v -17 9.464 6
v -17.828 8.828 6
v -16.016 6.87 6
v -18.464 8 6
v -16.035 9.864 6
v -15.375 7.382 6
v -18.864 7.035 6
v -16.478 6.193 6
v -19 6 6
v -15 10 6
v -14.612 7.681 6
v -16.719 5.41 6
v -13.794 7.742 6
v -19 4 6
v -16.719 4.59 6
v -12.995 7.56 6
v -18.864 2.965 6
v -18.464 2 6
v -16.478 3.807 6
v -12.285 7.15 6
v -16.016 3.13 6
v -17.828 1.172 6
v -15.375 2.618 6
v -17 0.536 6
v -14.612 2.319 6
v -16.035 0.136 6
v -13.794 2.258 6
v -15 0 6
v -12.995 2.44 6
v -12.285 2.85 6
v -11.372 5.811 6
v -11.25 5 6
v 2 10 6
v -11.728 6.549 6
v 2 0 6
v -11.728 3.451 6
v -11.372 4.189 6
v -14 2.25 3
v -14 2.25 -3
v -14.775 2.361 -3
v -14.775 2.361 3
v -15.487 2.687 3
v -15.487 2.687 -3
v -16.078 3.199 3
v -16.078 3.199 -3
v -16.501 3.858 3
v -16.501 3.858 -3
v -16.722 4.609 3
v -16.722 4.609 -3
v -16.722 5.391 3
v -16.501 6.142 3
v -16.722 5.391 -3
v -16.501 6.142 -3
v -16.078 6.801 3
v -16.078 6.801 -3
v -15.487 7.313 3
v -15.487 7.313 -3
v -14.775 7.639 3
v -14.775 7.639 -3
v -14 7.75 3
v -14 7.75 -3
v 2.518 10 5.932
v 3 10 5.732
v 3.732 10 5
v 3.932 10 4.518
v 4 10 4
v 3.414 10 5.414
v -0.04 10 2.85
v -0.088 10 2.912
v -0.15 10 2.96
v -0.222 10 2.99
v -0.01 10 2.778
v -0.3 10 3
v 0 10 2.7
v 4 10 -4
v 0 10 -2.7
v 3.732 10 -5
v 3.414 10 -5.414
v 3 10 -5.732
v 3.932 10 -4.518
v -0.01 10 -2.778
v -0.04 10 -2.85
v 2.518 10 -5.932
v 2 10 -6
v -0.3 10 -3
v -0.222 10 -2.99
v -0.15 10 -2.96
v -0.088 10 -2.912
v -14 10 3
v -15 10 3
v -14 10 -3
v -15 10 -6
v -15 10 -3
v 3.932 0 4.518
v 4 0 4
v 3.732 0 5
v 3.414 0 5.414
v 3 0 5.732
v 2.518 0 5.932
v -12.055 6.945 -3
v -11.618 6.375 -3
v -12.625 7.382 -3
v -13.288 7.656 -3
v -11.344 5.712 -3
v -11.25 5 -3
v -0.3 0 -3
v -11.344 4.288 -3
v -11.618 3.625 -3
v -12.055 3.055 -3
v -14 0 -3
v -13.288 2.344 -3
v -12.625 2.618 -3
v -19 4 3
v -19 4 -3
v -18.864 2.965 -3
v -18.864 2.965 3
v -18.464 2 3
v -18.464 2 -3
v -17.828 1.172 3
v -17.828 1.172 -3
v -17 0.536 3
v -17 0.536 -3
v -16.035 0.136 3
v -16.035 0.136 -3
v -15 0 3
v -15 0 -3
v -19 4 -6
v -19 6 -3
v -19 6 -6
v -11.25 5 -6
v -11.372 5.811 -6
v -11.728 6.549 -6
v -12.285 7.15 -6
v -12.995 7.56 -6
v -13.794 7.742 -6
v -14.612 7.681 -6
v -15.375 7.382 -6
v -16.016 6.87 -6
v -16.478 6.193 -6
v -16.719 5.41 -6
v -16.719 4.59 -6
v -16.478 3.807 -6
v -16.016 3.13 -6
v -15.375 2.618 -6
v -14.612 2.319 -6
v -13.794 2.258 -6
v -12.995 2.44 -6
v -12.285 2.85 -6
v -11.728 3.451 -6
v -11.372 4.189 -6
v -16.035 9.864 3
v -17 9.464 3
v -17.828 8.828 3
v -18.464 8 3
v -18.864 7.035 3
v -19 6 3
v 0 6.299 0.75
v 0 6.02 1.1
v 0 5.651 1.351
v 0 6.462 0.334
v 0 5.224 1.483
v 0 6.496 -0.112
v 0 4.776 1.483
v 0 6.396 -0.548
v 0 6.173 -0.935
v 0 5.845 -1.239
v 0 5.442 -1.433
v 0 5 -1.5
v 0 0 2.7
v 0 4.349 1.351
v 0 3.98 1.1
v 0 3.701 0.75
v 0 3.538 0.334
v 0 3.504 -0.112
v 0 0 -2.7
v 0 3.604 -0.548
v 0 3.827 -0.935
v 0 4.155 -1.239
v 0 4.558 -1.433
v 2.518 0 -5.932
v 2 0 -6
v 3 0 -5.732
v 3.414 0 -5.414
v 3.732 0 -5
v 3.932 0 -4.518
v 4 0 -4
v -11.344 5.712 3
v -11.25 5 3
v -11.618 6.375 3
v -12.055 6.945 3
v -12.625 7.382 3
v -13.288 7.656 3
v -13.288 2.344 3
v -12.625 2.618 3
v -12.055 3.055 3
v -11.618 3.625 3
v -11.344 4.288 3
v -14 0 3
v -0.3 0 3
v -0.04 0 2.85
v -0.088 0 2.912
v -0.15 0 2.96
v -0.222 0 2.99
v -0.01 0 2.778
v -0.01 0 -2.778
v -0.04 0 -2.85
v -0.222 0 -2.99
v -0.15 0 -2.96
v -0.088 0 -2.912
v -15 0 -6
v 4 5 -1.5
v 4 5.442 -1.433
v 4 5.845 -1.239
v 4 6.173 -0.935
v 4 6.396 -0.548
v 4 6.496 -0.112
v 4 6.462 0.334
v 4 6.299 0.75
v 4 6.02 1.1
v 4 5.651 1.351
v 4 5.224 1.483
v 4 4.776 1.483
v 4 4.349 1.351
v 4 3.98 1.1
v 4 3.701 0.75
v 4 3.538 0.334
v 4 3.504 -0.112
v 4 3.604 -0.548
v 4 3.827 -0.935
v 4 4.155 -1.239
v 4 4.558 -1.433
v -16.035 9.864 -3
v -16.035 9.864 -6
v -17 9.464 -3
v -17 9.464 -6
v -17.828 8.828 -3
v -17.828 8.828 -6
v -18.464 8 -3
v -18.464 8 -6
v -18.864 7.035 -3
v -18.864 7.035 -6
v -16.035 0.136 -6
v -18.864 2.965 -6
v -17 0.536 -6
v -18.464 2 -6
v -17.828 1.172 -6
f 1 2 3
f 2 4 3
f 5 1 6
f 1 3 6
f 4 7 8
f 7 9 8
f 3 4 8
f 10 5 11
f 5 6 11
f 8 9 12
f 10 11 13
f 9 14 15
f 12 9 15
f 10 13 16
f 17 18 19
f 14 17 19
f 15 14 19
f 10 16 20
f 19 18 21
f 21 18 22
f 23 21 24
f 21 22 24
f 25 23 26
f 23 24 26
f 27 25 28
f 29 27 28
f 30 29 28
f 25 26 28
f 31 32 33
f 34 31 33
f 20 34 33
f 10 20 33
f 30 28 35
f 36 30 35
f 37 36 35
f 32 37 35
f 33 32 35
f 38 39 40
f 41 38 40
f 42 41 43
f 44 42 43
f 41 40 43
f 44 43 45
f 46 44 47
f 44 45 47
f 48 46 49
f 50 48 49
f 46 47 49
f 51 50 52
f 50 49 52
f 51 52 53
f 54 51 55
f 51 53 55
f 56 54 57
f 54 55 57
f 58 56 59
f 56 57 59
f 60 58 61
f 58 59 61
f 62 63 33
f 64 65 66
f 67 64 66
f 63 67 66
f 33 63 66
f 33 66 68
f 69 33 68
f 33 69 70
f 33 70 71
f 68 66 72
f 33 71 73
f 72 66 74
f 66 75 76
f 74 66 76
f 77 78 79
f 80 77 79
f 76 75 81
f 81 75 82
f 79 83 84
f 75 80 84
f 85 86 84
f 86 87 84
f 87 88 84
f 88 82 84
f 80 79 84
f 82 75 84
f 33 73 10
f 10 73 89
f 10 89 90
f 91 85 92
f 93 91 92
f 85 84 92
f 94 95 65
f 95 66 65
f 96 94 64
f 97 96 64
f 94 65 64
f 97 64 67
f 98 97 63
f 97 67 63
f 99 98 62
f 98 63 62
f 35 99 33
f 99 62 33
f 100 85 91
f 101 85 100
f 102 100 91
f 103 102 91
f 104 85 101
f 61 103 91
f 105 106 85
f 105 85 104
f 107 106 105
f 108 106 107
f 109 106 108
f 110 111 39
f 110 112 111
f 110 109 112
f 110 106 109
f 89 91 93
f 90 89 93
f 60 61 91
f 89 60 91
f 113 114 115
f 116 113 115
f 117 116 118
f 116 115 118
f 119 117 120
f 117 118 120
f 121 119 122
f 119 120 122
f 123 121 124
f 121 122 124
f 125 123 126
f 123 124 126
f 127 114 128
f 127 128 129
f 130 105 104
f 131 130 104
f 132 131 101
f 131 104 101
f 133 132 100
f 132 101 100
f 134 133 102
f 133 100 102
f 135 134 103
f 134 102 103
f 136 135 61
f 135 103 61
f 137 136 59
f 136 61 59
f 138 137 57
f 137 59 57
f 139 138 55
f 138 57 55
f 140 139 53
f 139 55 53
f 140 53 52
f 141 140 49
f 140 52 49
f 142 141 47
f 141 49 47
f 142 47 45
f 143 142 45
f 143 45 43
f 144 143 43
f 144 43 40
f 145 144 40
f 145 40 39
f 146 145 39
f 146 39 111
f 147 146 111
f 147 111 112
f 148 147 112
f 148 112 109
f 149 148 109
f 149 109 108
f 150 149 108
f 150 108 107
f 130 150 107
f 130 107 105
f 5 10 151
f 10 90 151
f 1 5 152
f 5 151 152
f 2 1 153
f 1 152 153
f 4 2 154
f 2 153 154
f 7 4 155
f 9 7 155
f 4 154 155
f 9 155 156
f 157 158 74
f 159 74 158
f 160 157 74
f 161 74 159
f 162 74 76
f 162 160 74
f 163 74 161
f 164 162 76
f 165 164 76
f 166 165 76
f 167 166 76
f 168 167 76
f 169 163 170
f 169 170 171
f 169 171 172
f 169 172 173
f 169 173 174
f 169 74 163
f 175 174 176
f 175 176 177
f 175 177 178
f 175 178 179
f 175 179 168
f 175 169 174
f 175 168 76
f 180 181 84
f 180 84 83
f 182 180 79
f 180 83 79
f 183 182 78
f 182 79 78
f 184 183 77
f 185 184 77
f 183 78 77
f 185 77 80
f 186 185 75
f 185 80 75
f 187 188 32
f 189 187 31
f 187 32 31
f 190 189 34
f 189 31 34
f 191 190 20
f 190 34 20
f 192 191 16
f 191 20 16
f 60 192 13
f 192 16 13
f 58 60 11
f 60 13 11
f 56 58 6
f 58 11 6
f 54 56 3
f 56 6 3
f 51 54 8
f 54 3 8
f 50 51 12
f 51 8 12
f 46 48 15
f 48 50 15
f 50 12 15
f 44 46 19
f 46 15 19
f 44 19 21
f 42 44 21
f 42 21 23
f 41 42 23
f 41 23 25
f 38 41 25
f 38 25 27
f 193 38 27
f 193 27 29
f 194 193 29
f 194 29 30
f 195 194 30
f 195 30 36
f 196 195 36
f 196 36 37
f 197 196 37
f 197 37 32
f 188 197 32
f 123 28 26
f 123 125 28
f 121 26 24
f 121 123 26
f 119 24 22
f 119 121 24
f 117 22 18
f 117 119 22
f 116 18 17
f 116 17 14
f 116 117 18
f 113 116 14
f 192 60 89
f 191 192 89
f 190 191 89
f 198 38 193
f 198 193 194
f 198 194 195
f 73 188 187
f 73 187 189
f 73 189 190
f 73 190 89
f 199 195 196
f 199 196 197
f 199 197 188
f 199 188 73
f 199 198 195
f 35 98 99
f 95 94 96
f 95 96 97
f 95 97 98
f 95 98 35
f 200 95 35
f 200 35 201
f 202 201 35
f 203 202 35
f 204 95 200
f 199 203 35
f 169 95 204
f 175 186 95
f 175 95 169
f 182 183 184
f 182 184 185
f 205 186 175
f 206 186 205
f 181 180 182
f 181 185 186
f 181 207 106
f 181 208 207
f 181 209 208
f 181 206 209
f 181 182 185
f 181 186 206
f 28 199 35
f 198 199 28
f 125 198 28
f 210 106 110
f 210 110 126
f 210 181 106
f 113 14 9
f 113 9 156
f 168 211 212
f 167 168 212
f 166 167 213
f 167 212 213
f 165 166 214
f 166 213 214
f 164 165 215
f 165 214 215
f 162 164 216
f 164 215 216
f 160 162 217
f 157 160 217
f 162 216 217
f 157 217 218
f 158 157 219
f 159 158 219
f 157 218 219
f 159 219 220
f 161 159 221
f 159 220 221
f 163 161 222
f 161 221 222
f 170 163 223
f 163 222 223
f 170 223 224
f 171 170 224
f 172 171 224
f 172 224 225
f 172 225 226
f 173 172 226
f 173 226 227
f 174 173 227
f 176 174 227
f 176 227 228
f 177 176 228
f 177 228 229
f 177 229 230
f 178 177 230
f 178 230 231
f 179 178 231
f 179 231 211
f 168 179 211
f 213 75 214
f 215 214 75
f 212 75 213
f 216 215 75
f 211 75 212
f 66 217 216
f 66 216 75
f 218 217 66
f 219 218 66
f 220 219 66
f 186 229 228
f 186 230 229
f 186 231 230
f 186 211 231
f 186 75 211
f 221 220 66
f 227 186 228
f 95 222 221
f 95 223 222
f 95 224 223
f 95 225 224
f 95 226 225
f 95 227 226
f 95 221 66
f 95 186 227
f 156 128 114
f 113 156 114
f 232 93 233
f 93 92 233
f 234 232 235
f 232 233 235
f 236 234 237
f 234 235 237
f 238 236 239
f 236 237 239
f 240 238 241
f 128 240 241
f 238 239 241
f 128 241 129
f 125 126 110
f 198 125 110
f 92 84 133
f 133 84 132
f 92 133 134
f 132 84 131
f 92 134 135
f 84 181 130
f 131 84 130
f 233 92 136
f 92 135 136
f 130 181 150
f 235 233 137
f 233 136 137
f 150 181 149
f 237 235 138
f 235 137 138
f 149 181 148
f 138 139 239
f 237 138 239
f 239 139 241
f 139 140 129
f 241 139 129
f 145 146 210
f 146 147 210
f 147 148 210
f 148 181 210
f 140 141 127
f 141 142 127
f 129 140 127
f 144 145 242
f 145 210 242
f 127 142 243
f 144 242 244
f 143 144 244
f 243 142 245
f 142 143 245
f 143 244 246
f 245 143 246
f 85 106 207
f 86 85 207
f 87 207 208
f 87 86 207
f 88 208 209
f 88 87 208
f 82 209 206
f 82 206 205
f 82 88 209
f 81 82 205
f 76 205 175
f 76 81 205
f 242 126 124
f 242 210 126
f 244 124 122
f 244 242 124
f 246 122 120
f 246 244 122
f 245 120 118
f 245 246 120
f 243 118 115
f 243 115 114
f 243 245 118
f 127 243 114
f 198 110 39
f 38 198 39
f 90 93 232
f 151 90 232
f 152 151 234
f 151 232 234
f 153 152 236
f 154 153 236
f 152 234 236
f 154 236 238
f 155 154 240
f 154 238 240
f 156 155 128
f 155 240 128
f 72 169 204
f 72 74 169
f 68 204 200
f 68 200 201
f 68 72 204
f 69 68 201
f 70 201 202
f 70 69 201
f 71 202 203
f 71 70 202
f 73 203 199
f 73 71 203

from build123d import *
from build123d.topology import SkipClean

# Parameters (mm, degrees)
EXTRUDE_1_DEPTH     = 10
SKETCH_2_R          = 2.75
CUT_EXTRUDE_1_DEPTH = 16
FILLET_1_R          = 4
SKETCH_3_R          = 1.5
CUT_EXTRUDE_2_DEPTH = 10
FILLET_2_R          = 2
FILLET_3_R          = 0.3
EXTRUDE_4_DEPTH     = 6


with BuildPart() as part:
    # 草图1 → 凸台-拉伸1 (new body)
    with BuildSketch(Plane(origin=(0, 0, 0), x_dir=(1, 0, 0), z_dir=(0, 1, 0))):
        Polygon((0, 3), (-19, 3), (-19, 6), (0, 6), (4, 6), (4, -6), (0, -6), (-19, -6), (-19, -3), (0, -3), align=None)
    extrude(amount=EXTRUDE_1_DEPTH)

    # 草图2 → 切除-拉伸1 (cut)
    with BuildSketch(Plane.XY.offset(6)):
        with Locations((-14, 5)):
            Circle(SKETCH_2_R)
    extrude(amount=-CUT_EXTRUDE_1_DEPTH, mode=Mode.SUBTRACT)

    # 圆角1
    fillet_1_edges = [part.edges().sort_by_distance(p)[0] for p in [
        (-19, 0, -4.5),
        (-19, 10, 4.5),
        (-19, 0, 4.5),
        (-19, 10, -4.5),
    ]]
    fillet(fillet_1_edges, radius=FILLET_1_R)

    # 草图3 → 切除-拉伸2 (cut)
    with BuildSketch(Plane(origin=(4, 0, 0), x_dir=(0, 0, -1), z_dir=(1, 0, 0))):
        with Locations((0, 5)):
            Circle(SKETCH_3_R)
    extrude(amount=-CUT_EXTRUDE_2_DEPTH, mode=Mode.SUBTRACT)

    # 圆角2
    fillet_2_edges = [part.edges().sort_by_distance(p)[0] for p in [
        (4, 5, -6),
        (4, 5, 6),
    ]]
    fillet(fillet_2_edges, radius=FILLET_2_R)

    # 圆角3
    fillet_3_edges = [part.edges().sort_by_distance(p)[0] for p in [
        (0, 5, -3),
        (0, 5, 3),
    ]]
    fillet(fillet_3_edges, radius=FILLET_3_R)

    # 草图9 → 凸台-拉伸4 (add)
    with SkipClean():  # the faces are left unmerged after this step: merging them gives an invalid solid
        with BuildSketch(Plane.XY.offset(-3)):
            with BuildLine():
                ThreePointArc((-15, 10), (-17.828427125, 8.828427125), (-19, 6))
                Line((-19, 6), (-19, 4))
                ThreePointArc((-19, 4), (-17.828427125, 1.171572875), (-15, 0))
                Line((-15, 0), (-14, 0))
                Line((-14, 0), (-14, 2.25))
                ThreePointArc((-14, 2.25), (-16.75, 5), (-14, 7.75))
                Line((-14, 7.75), (-14, 10))
                Line((-14, 10), (-15, 10))
            make_face()
        extrude(amount=EXTRUDE_4_DEPTH)


solid = part.part
